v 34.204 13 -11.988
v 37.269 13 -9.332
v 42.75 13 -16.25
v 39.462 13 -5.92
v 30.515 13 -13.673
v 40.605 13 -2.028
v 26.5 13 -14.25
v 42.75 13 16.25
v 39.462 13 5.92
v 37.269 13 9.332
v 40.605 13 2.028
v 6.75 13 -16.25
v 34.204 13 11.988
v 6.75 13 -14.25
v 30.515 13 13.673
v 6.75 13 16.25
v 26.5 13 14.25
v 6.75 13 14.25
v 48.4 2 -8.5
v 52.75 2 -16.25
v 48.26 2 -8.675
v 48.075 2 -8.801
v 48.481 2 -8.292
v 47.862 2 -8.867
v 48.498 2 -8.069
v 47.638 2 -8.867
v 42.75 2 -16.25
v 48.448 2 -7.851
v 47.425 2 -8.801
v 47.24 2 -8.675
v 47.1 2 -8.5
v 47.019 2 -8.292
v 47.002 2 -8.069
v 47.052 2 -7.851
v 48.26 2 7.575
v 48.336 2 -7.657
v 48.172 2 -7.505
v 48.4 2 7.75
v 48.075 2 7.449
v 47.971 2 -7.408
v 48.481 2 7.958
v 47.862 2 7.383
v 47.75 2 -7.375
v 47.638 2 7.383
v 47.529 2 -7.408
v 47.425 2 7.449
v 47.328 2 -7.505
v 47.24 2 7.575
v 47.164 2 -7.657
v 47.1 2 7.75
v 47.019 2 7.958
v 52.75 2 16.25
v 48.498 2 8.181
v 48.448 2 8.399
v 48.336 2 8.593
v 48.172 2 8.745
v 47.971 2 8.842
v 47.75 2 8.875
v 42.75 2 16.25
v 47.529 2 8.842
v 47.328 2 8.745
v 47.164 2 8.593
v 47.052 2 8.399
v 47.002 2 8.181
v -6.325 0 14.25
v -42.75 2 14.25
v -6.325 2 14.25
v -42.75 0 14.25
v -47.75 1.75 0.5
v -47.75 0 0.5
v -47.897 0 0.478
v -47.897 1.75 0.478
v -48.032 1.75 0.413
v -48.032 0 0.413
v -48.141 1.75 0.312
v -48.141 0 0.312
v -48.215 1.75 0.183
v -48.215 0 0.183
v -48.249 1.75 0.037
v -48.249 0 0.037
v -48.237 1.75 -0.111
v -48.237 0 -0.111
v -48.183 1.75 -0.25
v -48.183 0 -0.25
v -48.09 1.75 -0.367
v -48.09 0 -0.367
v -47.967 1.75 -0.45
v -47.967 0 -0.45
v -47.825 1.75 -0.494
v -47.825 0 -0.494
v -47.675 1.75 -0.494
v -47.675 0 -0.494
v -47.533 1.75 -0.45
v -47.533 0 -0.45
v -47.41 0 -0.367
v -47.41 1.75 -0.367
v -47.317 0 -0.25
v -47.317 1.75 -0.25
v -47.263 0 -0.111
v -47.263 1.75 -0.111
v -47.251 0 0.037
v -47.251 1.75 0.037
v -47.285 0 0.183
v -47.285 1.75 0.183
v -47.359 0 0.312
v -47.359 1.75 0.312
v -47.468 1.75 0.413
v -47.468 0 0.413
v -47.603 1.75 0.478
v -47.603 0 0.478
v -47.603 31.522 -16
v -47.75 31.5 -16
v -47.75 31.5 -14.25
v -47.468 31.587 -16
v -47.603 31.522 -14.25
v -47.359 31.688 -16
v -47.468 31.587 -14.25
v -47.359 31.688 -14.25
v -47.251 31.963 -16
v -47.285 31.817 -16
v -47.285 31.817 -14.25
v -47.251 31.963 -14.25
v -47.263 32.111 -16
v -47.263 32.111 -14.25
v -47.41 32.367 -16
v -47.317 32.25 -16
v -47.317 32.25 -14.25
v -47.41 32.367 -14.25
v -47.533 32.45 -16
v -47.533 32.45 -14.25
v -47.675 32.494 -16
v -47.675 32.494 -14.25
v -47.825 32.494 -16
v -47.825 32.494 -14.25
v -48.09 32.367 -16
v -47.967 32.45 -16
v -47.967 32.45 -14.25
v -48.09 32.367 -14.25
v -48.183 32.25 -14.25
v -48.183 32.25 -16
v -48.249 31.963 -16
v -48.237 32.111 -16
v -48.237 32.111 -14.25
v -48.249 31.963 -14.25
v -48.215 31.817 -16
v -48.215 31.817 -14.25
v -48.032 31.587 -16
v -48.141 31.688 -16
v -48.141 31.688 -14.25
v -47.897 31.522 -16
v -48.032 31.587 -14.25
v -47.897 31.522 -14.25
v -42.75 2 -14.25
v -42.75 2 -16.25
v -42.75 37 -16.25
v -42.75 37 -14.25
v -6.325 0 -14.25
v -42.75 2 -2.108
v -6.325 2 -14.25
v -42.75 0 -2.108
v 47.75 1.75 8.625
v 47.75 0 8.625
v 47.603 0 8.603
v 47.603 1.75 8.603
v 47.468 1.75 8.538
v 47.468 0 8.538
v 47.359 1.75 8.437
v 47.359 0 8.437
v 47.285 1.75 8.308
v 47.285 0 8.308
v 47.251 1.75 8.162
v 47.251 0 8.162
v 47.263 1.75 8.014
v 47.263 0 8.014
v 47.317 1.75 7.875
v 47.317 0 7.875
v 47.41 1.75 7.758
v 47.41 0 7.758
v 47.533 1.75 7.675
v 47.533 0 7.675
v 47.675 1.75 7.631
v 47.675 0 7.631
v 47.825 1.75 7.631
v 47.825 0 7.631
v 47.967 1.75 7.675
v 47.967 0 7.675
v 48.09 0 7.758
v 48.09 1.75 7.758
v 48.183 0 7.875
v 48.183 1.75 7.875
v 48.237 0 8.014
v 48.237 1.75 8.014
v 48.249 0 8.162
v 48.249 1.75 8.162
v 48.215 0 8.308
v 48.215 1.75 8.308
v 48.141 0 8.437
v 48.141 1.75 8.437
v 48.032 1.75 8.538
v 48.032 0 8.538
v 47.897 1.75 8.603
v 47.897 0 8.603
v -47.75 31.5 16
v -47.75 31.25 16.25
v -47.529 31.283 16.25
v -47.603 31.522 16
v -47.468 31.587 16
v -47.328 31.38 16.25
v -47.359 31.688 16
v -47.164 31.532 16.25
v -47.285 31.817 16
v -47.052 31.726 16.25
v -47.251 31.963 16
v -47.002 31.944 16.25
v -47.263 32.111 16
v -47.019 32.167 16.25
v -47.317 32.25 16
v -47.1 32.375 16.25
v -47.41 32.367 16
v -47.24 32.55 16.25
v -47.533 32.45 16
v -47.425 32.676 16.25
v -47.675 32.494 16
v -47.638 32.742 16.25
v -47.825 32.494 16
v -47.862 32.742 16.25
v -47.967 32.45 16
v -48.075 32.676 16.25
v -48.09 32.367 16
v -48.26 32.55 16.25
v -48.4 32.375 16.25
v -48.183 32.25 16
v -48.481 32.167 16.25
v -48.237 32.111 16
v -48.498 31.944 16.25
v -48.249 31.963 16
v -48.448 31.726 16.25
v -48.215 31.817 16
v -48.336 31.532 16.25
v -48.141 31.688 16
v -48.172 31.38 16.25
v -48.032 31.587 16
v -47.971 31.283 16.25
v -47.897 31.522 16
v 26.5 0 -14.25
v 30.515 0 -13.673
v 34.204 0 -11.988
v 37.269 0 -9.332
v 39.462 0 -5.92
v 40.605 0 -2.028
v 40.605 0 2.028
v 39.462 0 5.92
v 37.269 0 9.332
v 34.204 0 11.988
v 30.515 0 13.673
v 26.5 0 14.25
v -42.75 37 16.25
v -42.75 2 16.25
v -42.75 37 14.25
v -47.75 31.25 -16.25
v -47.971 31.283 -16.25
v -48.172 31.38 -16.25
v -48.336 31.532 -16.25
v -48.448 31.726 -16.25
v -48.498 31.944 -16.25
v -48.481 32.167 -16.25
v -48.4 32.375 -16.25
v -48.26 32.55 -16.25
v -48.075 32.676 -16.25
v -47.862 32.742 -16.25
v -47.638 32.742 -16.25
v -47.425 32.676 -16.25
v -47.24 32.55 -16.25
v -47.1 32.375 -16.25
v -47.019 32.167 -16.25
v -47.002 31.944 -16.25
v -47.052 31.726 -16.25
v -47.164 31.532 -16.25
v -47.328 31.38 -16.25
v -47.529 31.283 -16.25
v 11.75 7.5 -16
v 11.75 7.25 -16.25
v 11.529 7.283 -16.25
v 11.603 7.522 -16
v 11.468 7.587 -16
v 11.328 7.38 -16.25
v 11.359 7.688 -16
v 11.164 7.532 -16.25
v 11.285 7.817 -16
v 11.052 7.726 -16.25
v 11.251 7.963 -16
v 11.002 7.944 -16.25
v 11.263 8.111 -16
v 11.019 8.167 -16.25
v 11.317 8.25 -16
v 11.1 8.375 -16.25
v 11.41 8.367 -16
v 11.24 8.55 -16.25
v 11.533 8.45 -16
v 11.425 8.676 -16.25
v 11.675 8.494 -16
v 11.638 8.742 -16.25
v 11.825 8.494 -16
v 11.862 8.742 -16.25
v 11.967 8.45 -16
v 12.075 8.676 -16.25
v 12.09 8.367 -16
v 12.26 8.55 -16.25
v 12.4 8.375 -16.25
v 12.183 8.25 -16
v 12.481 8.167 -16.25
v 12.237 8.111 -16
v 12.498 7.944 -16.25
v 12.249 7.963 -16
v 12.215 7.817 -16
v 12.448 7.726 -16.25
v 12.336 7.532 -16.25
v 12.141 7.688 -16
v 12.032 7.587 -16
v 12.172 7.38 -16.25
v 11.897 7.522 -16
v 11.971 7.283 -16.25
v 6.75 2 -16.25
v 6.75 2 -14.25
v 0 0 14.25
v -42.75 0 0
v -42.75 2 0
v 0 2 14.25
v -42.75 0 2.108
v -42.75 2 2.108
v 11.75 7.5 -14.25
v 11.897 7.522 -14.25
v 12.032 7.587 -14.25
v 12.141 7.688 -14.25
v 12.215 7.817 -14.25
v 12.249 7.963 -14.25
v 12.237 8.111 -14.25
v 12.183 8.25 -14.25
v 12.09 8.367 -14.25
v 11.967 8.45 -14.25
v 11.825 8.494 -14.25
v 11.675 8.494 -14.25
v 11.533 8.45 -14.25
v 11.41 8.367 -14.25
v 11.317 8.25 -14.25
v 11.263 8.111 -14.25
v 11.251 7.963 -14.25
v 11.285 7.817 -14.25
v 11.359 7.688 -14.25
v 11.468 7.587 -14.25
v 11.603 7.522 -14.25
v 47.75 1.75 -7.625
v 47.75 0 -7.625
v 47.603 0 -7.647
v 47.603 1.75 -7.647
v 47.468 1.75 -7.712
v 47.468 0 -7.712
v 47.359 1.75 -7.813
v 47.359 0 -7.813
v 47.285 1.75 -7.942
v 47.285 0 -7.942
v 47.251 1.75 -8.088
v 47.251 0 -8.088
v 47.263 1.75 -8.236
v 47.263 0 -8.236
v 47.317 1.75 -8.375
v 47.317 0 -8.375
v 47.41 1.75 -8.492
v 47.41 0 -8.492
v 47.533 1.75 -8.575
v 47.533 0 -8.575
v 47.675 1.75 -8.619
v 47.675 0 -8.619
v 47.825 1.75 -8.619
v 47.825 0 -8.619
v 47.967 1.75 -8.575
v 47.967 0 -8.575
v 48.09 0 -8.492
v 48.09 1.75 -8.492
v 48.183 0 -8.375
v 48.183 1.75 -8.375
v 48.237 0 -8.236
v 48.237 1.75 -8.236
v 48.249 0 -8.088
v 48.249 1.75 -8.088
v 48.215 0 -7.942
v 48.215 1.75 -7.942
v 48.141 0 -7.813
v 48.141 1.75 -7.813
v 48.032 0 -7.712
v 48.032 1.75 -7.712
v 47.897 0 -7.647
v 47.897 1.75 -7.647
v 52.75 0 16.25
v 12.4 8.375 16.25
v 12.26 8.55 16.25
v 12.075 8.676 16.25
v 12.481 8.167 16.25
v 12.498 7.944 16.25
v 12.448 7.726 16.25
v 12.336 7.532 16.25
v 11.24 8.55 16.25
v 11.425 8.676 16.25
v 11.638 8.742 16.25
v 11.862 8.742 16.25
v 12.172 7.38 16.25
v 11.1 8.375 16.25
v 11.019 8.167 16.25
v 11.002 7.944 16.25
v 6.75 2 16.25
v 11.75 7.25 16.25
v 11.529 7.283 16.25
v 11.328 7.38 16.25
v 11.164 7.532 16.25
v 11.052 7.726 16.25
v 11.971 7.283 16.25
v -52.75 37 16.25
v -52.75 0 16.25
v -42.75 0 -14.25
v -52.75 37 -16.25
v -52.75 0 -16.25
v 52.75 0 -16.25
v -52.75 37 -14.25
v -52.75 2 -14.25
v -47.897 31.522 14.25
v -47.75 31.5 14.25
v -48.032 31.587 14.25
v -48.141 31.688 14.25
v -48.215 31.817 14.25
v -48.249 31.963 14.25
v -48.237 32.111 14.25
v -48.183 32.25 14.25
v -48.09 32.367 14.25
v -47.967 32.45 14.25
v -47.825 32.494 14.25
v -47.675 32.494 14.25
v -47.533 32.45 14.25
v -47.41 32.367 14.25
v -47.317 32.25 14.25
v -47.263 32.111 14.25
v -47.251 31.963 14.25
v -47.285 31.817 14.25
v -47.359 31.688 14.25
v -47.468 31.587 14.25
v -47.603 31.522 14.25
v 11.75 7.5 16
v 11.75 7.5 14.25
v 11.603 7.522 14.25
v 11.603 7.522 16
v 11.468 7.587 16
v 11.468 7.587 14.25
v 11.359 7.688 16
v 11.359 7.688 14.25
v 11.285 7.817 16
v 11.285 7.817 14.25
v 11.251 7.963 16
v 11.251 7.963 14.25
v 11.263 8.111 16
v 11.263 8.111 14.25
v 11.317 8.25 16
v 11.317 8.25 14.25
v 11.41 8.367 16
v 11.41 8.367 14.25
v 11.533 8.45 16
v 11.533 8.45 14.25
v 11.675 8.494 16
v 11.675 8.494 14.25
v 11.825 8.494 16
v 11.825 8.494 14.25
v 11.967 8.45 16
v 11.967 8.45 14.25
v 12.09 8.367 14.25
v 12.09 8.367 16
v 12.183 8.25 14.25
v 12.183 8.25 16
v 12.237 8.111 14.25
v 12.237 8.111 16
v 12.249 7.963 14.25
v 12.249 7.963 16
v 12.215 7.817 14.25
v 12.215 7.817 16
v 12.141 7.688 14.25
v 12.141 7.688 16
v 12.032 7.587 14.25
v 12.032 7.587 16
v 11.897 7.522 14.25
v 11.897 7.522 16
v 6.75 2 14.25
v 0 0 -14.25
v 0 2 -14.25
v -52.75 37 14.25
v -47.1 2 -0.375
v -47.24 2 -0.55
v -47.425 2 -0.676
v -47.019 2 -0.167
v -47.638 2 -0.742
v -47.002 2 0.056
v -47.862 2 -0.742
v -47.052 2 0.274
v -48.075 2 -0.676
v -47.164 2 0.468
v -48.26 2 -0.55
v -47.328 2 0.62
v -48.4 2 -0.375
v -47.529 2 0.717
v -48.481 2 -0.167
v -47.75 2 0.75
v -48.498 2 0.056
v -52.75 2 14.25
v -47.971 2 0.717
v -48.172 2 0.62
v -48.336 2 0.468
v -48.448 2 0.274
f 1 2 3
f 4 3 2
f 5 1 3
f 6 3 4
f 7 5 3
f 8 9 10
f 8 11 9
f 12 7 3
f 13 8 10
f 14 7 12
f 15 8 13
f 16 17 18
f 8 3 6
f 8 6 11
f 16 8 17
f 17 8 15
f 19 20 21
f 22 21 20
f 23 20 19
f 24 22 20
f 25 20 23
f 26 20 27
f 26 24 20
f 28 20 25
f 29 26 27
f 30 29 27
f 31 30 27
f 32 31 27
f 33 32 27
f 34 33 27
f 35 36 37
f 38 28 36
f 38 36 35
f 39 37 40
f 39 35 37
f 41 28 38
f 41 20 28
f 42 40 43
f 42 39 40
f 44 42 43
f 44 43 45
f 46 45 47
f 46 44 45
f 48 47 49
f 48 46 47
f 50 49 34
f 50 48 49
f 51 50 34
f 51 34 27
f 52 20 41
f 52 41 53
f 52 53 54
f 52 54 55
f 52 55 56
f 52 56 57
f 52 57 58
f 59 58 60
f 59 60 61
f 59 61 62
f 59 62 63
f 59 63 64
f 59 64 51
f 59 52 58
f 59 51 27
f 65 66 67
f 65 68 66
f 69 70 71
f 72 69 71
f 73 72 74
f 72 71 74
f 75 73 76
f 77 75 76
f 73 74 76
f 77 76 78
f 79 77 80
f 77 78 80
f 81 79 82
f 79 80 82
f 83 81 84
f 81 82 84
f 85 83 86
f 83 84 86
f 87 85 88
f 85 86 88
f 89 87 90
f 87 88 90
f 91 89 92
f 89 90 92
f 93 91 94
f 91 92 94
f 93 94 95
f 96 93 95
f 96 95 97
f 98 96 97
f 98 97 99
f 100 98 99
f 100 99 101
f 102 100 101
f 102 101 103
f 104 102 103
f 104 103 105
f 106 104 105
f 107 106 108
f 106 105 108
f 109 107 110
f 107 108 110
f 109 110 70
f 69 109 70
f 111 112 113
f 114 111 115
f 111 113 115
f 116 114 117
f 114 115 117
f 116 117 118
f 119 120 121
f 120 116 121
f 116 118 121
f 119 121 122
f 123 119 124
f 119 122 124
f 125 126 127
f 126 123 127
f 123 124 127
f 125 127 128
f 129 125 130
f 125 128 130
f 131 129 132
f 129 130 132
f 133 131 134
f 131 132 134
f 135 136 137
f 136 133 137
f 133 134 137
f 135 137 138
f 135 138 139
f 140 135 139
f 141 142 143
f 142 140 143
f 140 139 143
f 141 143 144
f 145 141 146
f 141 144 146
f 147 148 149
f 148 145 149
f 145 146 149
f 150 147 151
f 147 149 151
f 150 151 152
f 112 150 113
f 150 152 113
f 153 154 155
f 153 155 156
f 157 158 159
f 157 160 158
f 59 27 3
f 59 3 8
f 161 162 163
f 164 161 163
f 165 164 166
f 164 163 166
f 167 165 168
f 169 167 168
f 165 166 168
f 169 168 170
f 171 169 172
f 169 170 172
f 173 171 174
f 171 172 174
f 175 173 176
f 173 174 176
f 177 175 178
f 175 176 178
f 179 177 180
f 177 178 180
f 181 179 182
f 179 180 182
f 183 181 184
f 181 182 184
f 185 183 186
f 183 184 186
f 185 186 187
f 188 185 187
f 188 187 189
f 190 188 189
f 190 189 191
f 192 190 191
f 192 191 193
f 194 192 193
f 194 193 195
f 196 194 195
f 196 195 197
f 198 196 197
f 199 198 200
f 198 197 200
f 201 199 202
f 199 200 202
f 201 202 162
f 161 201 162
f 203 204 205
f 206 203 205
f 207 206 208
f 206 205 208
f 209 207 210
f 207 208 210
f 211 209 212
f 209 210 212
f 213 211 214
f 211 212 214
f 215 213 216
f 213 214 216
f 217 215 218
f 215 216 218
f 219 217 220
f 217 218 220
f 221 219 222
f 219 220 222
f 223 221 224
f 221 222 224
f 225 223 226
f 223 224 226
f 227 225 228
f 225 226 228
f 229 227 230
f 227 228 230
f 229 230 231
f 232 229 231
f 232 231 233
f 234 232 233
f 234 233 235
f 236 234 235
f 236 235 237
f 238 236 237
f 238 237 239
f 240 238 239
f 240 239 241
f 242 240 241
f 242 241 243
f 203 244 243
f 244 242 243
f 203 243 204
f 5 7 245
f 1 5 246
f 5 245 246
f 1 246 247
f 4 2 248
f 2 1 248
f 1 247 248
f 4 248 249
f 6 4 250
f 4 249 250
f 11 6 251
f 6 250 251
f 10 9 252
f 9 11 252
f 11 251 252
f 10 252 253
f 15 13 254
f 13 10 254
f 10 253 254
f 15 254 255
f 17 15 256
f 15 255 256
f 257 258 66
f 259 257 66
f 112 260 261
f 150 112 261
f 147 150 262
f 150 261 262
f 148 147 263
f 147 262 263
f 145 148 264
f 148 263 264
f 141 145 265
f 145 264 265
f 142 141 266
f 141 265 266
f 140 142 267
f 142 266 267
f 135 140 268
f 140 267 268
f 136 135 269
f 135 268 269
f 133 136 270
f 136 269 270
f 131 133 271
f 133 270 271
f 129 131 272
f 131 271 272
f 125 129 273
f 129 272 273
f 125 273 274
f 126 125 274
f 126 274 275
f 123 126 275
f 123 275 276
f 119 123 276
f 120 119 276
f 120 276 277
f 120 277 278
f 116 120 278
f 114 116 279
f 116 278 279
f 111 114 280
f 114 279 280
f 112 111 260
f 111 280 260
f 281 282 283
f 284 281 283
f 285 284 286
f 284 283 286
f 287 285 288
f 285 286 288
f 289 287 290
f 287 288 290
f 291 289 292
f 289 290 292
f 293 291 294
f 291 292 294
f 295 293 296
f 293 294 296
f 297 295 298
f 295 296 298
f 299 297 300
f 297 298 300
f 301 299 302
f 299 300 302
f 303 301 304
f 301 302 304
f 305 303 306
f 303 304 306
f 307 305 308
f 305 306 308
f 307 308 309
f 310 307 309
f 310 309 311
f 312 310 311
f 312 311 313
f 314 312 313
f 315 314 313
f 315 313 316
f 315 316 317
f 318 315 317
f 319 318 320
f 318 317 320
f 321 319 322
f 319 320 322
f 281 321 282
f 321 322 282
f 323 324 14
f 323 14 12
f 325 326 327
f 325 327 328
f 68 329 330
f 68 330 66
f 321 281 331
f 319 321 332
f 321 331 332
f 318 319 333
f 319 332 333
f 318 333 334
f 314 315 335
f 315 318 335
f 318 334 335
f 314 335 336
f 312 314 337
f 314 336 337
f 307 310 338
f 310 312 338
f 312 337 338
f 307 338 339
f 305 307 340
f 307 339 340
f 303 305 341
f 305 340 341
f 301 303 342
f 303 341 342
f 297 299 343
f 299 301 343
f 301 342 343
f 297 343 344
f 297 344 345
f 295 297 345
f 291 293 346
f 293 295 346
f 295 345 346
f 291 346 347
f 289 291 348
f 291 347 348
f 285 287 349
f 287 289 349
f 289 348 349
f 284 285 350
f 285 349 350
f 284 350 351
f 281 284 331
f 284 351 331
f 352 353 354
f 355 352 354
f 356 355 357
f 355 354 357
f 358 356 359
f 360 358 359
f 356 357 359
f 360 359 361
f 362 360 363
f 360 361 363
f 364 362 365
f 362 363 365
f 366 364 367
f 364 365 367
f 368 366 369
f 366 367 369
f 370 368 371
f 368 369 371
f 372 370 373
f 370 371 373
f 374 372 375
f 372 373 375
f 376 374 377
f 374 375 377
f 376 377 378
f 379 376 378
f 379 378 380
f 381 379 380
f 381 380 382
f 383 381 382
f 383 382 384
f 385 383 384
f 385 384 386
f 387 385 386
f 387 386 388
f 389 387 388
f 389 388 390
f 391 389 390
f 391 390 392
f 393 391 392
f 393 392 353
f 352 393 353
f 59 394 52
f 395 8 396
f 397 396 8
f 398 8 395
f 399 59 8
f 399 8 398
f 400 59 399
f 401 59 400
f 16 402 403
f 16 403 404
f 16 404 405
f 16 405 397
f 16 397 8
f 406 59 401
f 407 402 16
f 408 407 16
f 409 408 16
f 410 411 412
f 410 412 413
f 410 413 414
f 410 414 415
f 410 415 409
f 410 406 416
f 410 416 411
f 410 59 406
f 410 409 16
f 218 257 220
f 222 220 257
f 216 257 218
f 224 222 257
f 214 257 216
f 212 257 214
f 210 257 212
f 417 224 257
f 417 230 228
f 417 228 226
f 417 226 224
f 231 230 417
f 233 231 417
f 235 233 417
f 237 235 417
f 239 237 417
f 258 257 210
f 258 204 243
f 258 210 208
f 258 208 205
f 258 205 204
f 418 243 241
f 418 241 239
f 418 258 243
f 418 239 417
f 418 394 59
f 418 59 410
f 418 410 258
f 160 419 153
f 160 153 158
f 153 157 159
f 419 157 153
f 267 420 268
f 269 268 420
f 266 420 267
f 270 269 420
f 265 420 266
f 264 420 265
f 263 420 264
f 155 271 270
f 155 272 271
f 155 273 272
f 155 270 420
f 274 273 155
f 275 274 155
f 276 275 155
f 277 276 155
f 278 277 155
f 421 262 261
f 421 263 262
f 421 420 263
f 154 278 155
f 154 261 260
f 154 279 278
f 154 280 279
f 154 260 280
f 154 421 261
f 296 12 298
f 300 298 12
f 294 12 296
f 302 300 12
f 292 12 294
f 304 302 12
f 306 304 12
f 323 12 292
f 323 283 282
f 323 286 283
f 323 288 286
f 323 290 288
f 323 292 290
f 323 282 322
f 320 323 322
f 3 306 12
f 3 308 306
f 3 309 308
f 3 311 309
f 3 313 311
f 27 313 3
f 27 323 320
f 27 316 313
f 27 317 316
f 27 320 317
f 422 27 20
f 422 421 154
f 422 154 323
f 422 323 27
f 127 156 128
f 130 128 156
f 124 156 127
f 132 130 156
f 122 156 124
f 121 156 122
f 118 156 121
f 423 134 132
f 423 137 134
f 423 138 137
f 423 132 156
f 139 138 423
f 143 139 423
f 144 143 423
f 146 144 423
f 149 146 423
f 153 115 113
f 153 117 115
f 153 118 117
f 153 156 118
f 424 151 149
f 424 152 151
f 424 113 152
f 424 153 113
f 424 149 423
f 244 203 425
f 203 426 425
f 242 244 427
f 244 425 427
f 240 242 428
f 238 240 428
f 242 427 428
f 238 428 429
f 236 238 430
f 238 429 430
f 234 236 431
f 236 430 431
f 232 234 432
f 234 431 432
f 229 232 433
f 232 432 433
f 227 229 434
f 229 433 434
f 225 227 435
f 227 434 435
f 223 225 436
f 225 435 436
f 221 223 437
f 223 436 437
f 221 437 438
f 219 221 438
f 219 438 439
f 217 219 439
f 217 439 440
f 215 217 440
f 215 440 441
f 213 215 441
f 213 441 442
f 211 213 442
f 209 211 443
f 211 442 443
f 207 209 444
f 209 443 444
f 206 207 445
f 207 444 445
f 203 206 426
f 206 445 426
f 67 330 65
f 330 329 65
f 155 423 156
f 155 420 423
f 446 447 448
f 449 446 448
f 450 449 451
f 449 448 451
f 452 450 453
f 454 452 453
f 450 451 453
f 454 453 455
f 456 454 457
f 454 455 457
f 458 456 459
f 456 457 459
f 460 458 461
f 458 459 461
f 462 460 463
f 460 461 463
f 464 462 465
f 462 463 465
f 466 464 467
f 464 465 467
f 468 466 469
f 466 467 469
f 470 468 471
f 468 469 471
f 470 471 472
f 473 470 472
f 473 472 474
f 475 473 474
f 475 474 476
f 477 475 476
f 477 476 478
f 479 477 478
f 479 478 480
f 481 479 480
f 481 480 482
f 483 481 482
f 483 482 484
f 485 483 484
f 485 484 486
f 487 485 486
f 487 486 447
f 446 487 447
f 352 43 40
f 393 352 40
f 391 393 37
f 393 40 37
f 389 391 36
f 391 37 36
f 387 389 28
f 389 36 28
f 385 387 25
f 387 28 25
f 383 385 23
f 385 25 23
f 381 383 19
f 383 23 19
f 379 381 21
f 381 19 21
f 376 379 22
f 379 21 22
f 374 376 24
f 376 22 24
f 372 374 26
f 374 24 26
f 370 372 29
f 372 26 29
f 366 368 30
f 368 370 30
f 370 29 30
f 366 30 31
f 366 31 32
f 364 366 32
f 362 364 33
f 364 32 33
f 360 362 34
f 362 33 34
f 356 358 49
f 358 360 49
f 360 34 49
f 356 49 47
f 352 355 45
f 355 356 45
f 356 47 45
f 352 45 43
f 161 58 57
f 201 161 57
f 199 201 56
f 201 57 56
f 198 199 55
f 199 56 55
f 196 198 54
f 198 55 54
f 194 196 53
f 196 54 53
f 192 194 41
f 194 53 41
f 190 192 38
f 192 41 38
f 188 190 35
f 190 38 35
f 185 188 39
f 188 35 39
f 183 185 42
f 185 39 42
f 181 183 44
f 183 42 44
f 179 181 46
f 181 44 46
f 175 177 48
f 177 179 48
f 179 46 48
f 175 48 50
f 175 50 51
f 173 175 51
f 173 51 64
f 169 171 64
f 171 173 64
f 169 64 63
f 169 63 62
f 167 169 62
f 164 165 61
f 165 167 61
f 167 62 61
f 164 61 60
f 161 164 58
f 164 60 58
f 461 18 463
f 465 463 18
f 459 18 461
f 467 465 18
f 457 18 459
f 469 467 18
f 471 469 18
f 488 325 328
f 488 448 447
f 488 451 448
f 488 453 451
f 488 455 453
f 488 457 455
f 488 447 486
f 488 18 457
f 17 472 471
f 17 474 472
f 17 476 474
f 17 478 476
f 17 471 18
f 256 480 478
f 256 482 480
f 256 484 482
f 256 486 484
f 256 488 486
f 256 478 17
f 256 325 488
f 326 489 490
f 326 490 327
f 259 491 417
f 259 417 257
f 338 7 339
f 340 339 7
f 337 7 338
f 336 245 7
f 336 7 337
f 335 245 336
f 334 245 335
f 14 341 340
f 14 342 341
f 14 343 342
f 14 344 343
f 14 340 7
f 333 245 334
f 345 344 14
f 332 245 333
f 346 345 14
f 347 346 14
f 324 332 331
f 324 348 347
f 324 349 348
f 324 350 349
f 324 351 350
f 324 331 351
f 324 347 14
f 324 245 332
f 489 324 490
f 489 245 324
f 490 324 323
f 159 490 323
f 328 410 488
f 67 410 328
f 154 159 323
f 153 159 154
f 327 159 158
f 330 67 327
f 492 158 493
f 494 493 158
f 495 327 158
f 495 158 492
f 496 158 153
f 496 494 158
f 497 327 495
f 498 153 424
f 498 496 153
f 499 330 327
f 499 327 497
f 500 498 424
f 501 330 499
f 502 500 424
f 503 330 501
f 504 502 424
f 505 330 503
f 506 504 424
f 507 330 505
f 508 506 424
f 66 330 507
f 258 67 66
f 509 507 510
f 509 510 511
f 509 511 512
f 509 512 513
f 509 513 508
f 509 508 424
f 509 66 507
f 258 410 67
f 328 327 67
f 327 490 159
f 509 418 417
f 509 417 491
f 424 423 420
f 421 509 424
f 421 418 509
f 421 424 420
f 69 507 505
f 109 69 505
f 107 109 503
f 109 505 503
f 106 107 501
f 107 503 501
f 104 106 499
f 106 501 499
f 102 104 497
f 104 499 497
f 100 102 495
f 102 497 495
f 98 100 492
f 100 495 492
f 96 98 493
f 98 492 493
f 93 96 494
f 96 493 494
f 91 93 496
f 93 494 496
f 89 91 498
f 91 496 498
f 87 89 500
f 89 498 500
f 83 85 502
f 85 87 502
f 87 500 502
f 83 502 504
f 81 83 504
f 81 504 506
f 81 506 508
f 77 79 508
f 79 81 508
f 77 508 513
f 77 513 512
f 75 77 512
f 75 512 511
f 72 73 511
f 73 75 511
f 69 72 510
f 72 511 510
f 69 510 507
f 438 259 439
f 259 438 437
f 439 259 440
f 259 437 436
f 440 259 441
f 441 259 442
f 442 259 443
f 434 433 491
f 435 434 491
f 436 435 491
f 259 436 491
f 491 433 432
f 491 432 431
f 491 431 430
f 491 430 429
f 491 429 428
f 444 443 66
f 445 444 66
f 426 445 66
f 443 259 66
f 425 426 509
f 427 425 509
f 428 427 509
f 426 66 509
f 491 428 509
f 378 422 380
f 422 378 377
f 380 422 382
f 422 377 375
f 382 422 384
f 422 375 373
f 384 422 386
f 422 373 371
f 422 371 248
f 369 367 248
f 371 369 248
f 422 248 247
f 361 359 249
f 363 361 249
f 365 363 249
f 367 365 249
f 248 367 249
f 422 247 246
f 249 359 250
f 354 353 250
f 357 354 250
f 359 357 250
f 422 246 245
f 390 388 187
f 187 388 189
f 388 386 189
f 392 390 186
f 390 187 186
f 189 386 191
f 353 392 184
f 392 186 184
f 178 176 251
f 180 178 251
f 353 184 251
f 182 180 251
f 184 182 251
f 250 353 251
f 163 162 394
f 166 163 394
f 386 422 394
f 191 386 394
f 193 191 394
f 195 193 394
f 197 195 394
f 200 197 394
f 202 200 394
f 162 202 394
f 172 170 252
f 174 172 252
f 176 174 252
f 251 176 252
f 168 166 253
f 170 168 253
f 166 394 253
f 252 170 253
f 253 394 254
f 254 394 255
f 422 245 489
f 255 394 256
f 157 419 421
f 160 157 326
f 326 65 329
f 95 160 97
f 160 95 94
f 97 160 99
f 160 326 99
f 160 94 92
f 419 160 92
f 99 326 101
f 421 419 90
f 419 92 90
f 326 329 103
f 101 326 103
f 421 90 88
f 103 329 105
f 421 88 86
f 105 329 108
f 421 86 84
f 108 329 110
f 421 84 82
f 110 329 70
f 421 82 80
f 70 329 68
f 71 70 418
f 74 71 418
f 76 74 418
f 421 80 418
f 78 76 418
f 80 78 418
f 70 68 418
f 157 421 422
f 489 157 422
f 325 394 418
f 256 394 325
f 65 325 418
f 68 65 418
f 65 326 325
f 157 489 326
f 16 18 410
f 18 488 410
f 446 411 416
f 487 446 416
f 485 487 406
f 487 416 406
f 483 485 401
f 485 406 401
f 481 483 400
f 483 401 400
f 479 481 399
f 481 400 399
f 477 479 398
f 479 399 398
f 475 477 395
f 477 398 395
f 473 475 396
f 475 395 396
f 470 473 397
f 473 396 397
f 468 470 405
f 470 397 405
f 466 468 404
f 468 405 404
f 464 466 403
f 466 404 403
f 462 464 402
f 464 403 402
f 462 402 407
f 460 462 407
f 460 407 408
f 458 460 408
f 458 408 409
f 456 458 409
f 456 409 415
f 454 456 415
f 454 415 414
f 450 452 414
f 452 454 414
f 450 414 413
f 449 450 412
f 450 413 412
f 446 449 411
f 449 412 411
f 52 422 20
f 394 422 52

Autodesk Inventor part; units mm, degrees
ref_plane "YZ Plane" through (0, 0, 0) normal (1, 0, 0) x (0, 1, 0)
ref_plane "XZ Plane" through (0, 0, 0) normal (0, 1, 0) x (-1, 0, 0)
ref_plane "XY Plane" through (0, 0, 0) normal (0, 0, 1) x (1, 0, 0)
sketch "Эскиз1" plane through (0, 0, 0) normal (0, 1, 0) x (-1, 0, 0)
  line L0 (-52.75, 16.25) -> (52.75, 16.25)
  line L1 (52.75, 16.25) -> (52.75, -16.25)
  line L2 (52.75, -16.25) -> (-52.75, -16.25)
  line L3 (-52.75, -16.25) -> (-52.75, 16.25)
  line L4 (-52.75, 16.25) -> (52.75, -16.25) construction
  line L5 (52.75, 16.25) -> (-52.75, -16.25) construction
  line L6 (-42.75, -14.25) -> (0, -14.25)
  line L7 (42.75, -14.25) -> (42.75, -2.1082)
  line L8 (42.75, 14.25) -> (6.3246, 14.25)
  line L9 (-42.75, 14.25) -> (-42.75, -14.25)
  line L10 (52.75, -16.25) -> (36.5, 0) construction
  line L11 (36.5, 0) -> (52.75, 16.25) construction
  line L12 (47.75, -16.25) -> (47.75, 16.25) construction
  line L13 (0, -22.75) -> (0, 22.75) construction
  line L14 (0, -16.25) -> (0, -14.25) construction
  line L15 (0, 14.25) -> (0, 16.25) construction
  line L16 (0, -14.25) -> (42.75, 0)
  line L17 (42.75, 0) -> (0, 14.25)
  line L18 (42.75, -2.1082) -> (6.3246, -14.25)
  line L19 (42.75, 2.1082) -> (6.3246, 14.25)
  line L20 (42.75, -2.1082) -> (42.1175, -0.2108) construction
  line L21 (42.75, 2.1082) -> (42.1175, 0.2108) construction
  line L22 (42.75, -2.1082) -> (42.75, 2.1082) construction
  line L23 (42.75, 2.1082) -> (42.75, 14.25)
  line L24 (6.3246, -14.25) -> (42.75, -14.25)
  line L25 (0, -14.25) -> (6.3246, -14.25) construction
  line L26 (6.3246, 14.25) -> (0, 14.25) construction
  line L27 (0, 14.25) -> (-42.75, 14.25)
  point P0 (0, 0)
  point P1 (0, 0)
  dimension "d0" = 105.5
  dimension "d4" = 10
  dimension "d5" = 10
  dimension "d8" = 5
  dimension "d24" = 28.5
  dimension "d29" = 2
extrude "Выдавливание1" add sketch "Эскиз1" along normal blind 2
sketch "Эскиз2" plane through (0, 0, 0) normal (0, 1, 0) x (-1, 0, 0)
  line L0 (-42.75, -16.25) -> (-42.75, 16.25)
  line L1 (52.75, 16.25) -> (-52.75, 16.25) projected
  line L2 (-52.75, 16.25) -> (-52.75, -16.25) projected
  line L3 (0, -14.25) -> (-42.75, -14.25) construction
  line L4 (-40.75, -14.25) -> (-40.75, 14.25) construction
  line L5 (6.3246, 14.25) -> (42.75, 14.25) construction
  line L6 (-40.75, -14.25) -> (-26.5, -14.25) construction
  line L7 (-6.75, -14.25) -> (-6.75, -16.25)
  line L8 (-52.75, -16.25) -> (52.75, -16.25) projected
  line L9 (-6.75, -16.25) -> (-42.75, -16.25)
  line L10 (-42.75, 16.25) -> (-6.75, 16.25)
  line L11 (-6.75, 14.25) -> (-26.5, 14.25)
  line L12 (-6.75, 14.25) -> (-6.75, 16.25)
  arc A0 (-26.5, 14.25) -> (-26.5, -14.25) centre (-26.5, 0) ccw
  line L13 (-26.5, -14.25) -> (-6.75, -14.25)
  line L14 (-26.5, 14.25) -> (-40.75, 14.25) construction
  line L15 (-42.75, -14.25) -> (-42.75, 14.25) projected
  point P0 (0, 0)
  point P1 (42.75, -14.25)
  point P2 (-42.75, -16.25)
  dimension "d13" = 2
  dimension "d14" = 34
extrude "Выдавливание2" add sketch "Эскиз2" along normal blind 13 contours L0 L1 L12 L11 A0 L13 L7 L8
sketch "Эскиз3" plane through (0, 2, 0) normal (0, 1, 0) x (1, 0, 0)
  line L0 (-42.75, 14.25) -> (-52.75, 14.25)
  line L1 (-52.75, 14.25) -> (-52.75, 16.25)
  line L2 (-52.75, 16.25) -> (-42.75, 16.25)
  line L3 (-42.75, 16.25) -> (-42.75, 14.25)
  line L4 (-52.75, 16.25) -> (-52.75, -16.25) construction
  line L5 (-52.75, -16.25) -> (-42.75, -16.25)
  line L6 (-42.75, -16.25) -> (-42.75, -14.25)
  line L7 (-42.75, -14.25) -> (-52.75, -14.25)
  line L8 (-52.75, -14.25) -> (-52.75, -16.25)
  point P0 (0, 0)
  point P1 (-42.75, 14.25)
extrude "Выдавливание3" add sketch "Эскиз3" along normal blind 35
sketch "Эскиз4" plane through (-52.75, 0, 16.25) normal (0, 0, 1) x (1, 0, 0)
  line L0 (10, 37) -> (0, 37) construction
  line L1 (0, 37) -> (10, 37) construction
  line L2 (10, 37) -> (10, 27) construction
  line L3 (10, 27) -> (0, 27) construction
  line L4 (0, 27) -> (0, 37) construction
  line L5 (105.5, 0) -> (0, 0) construction
  line L6 (0, 0) -> (0, 37) construction
  line L7 (10, 37) -> (10, 2) construction
  line L8 (10, 2) -> (59.5, 2) construction
  line L9 (59.5, 2) -> (59.5, 13) construction
  line L10 (59.5, 13) -> (95.5, 13) construction
  line L11 (95.5, 13) -> (95.5, 2) construction
  line L12 (95.5, 2) -> (105.5, 2) construction
  line L13 (105.5, 2) -> (105.5, 0) construction
  line L14 (10, 2) -> (10, 37) construction
  line L15 (0, 0) -> (0, 37) construction
  line L16 (10, 27) -> (0, 37) construction
  line L17 (10, 37) -> (0, 27) construction
  circle A0 centre (5, 32) radius 0.5
  line L18 (59.5, 13) -> (69.5, 13) construction
  line L19 (69.5, 13) -> (69.5, 3) construction
  line L20 (69.5, 3) -> (59.5, 3) construction
  line L21 (59.5, 3) -> (59.5, 13) construction
  line L22 (69.5, 13) -> (59.5, 3) construction
  line L23 (59.5, 2) -> (59.5, 13) construction
  line L24 (59.5, 13) -> (69.5, 3) construction
  circle A1 centre (64.5, 8) radius 0.5
  line L25 (0, 37) -> (10, 37) projected
  point P0 (52.75, 0)
  dimension "d19" = 1
  dimension "d20" = 10
  dimension "d21" = 1
hole "Отверстие1" at (-47.75, 32, 16.25) at (11.75, 8, 16.25) direction (0, 0, -1) diameter 1 depth 16.25 countersink diameter 1.5 countersink angle 90
mirror "Зеркальное отражение1" about plane through (0, 0, 0) normal (0, 0, 1) of "Отверстие1"
sketch "Эскиз5" plane through (0, 2, 0) normal (0, 1, 0) x (1, 0, 0)
  line L0 (-42.75, 2.1082) -> (-6.3246, 14.25) construction
  line L1 (-6.3246, 14.25) -> (-42.75, 14.25) construction
  line L2 (-42.75, 14.25) -> (-52.75, 14.25) construction
  line L3 (-52.75, -14.25) -> (-52.75, 14.25) construction
  line L4 (-52.75, -16.25) -> (-52.75, -14.25) construction
  line L5 (-42.75, -16.25) -> (-52.75, -16.25) construction
  line L6 (-42.75, -14.25) -> (-42.75, -16.25) construction
  line L7 (-42.75, -14.25) -> (-6.3246, -14.25) construction
  line L8 (-6.3246, -14.25) -> (-42.75, -2.1082) construction
  line L9 (-42.75, -2.1082) -> (-42.75, -14.25) construction
  line L10 (-42.75, 14.25) -> (-42.75, 2.1082) construction
  line L11 (-42.75, 16.25) -> (-42.75, 14.25) construction
  line L12 (-42.75, 16.25) -> (6.75, 16.25) construction
  line L13 (6.75, 16.25) -> (42.75, 16.25) construction
  line L14 (42.75, 16.25) -> (52.75, 16.25) construction
  line L15 (52.75, 16.25) -> (52.75, -16.25) construction
  line L16 (52.75, -16.25) -> (42.75, -16.25) construction
  line L17 (42.75, 16.25) -> (42.75, -16.25) construction
  line L18 (-52.75, 14.25) -> (-52.75, 16.25) construction
  line L19 (-52.75, 16.25) -> (-42.75, 16.25) construction
  line L20 (-52.75, -14.25) -> (-42.75, -14.25) construction
  line L21 (6.75, -16.25) -> (-42.75, -16.25) construction
  line L22 (42.75, -16.25) -> (6.75, -16.25) construction
  line L23 (6.75, 14.25) -> (6.75, 16.25) construction
  line L24 (6.75, 14.25) -> (0, 14.25) construction
  line L25 (0, 14.25) -> (-42.75, 0) construction
  line L26 (-42.75, 0) -> (0, -14.25) construction
  line L27 (0, -14.25) -> (6.75, -14.25) construction
  line L28 (6.75, -14.25) -> (26.5, -14.25) construction
  arc A0 (26.5, -14.25) -> (26.5, 14.25) centre (26.5, 0) ccw construction
  line L29 (26.5, 14.25) -> (6.75, 14.25) construction
  line L30 (6.75, -16.25) -> (6.75, -14.25) construction
  line L31 (-6.3246, -14.25) -> (-42.75, -14.25) construction
  line L32 (-52.75, 14.25) -> (-42.75, -14.25) construction
  line L33 (-42.75, 14.25) -> (-52.75, -14.25) construction
  line L34 (42.75, 16.25) -> (52.75, 0) construction
  line L35 (52.75, -16.25) -> (52.75, 16.25) construction
  line L36 (52.75, 0) -> (42.75, -16.25) construction
  line L37 (-52.75, -16.25) -> (52.75, -16.25) construction
  line L38 (52.75, -16.25) -> (42.75, 0) construction
  line L39 (52.75, 16.25) -> (-52.75, 16.25) construction
  line L40 (42.75, 0) -> (52.75, 16.25) construction
  circle A1 centre (-47.75, 0) radius 0.5
  circle A2 centre (47.75, 8.125) radius 0.5
  circle A3 centre (47.75, -8.125) radius 0.5
  point P0 (0, 0)
  dimension "d37" = 1
hole "Отверстие2" at (-47.75, 2, 0) at (47.75, 2, -8.125) at (47.75, 2, 8.125) direction (0, -1, 0) diameter 1 end through all countersink diameter 1.5 countersink angle 90
properties part number "frame"
